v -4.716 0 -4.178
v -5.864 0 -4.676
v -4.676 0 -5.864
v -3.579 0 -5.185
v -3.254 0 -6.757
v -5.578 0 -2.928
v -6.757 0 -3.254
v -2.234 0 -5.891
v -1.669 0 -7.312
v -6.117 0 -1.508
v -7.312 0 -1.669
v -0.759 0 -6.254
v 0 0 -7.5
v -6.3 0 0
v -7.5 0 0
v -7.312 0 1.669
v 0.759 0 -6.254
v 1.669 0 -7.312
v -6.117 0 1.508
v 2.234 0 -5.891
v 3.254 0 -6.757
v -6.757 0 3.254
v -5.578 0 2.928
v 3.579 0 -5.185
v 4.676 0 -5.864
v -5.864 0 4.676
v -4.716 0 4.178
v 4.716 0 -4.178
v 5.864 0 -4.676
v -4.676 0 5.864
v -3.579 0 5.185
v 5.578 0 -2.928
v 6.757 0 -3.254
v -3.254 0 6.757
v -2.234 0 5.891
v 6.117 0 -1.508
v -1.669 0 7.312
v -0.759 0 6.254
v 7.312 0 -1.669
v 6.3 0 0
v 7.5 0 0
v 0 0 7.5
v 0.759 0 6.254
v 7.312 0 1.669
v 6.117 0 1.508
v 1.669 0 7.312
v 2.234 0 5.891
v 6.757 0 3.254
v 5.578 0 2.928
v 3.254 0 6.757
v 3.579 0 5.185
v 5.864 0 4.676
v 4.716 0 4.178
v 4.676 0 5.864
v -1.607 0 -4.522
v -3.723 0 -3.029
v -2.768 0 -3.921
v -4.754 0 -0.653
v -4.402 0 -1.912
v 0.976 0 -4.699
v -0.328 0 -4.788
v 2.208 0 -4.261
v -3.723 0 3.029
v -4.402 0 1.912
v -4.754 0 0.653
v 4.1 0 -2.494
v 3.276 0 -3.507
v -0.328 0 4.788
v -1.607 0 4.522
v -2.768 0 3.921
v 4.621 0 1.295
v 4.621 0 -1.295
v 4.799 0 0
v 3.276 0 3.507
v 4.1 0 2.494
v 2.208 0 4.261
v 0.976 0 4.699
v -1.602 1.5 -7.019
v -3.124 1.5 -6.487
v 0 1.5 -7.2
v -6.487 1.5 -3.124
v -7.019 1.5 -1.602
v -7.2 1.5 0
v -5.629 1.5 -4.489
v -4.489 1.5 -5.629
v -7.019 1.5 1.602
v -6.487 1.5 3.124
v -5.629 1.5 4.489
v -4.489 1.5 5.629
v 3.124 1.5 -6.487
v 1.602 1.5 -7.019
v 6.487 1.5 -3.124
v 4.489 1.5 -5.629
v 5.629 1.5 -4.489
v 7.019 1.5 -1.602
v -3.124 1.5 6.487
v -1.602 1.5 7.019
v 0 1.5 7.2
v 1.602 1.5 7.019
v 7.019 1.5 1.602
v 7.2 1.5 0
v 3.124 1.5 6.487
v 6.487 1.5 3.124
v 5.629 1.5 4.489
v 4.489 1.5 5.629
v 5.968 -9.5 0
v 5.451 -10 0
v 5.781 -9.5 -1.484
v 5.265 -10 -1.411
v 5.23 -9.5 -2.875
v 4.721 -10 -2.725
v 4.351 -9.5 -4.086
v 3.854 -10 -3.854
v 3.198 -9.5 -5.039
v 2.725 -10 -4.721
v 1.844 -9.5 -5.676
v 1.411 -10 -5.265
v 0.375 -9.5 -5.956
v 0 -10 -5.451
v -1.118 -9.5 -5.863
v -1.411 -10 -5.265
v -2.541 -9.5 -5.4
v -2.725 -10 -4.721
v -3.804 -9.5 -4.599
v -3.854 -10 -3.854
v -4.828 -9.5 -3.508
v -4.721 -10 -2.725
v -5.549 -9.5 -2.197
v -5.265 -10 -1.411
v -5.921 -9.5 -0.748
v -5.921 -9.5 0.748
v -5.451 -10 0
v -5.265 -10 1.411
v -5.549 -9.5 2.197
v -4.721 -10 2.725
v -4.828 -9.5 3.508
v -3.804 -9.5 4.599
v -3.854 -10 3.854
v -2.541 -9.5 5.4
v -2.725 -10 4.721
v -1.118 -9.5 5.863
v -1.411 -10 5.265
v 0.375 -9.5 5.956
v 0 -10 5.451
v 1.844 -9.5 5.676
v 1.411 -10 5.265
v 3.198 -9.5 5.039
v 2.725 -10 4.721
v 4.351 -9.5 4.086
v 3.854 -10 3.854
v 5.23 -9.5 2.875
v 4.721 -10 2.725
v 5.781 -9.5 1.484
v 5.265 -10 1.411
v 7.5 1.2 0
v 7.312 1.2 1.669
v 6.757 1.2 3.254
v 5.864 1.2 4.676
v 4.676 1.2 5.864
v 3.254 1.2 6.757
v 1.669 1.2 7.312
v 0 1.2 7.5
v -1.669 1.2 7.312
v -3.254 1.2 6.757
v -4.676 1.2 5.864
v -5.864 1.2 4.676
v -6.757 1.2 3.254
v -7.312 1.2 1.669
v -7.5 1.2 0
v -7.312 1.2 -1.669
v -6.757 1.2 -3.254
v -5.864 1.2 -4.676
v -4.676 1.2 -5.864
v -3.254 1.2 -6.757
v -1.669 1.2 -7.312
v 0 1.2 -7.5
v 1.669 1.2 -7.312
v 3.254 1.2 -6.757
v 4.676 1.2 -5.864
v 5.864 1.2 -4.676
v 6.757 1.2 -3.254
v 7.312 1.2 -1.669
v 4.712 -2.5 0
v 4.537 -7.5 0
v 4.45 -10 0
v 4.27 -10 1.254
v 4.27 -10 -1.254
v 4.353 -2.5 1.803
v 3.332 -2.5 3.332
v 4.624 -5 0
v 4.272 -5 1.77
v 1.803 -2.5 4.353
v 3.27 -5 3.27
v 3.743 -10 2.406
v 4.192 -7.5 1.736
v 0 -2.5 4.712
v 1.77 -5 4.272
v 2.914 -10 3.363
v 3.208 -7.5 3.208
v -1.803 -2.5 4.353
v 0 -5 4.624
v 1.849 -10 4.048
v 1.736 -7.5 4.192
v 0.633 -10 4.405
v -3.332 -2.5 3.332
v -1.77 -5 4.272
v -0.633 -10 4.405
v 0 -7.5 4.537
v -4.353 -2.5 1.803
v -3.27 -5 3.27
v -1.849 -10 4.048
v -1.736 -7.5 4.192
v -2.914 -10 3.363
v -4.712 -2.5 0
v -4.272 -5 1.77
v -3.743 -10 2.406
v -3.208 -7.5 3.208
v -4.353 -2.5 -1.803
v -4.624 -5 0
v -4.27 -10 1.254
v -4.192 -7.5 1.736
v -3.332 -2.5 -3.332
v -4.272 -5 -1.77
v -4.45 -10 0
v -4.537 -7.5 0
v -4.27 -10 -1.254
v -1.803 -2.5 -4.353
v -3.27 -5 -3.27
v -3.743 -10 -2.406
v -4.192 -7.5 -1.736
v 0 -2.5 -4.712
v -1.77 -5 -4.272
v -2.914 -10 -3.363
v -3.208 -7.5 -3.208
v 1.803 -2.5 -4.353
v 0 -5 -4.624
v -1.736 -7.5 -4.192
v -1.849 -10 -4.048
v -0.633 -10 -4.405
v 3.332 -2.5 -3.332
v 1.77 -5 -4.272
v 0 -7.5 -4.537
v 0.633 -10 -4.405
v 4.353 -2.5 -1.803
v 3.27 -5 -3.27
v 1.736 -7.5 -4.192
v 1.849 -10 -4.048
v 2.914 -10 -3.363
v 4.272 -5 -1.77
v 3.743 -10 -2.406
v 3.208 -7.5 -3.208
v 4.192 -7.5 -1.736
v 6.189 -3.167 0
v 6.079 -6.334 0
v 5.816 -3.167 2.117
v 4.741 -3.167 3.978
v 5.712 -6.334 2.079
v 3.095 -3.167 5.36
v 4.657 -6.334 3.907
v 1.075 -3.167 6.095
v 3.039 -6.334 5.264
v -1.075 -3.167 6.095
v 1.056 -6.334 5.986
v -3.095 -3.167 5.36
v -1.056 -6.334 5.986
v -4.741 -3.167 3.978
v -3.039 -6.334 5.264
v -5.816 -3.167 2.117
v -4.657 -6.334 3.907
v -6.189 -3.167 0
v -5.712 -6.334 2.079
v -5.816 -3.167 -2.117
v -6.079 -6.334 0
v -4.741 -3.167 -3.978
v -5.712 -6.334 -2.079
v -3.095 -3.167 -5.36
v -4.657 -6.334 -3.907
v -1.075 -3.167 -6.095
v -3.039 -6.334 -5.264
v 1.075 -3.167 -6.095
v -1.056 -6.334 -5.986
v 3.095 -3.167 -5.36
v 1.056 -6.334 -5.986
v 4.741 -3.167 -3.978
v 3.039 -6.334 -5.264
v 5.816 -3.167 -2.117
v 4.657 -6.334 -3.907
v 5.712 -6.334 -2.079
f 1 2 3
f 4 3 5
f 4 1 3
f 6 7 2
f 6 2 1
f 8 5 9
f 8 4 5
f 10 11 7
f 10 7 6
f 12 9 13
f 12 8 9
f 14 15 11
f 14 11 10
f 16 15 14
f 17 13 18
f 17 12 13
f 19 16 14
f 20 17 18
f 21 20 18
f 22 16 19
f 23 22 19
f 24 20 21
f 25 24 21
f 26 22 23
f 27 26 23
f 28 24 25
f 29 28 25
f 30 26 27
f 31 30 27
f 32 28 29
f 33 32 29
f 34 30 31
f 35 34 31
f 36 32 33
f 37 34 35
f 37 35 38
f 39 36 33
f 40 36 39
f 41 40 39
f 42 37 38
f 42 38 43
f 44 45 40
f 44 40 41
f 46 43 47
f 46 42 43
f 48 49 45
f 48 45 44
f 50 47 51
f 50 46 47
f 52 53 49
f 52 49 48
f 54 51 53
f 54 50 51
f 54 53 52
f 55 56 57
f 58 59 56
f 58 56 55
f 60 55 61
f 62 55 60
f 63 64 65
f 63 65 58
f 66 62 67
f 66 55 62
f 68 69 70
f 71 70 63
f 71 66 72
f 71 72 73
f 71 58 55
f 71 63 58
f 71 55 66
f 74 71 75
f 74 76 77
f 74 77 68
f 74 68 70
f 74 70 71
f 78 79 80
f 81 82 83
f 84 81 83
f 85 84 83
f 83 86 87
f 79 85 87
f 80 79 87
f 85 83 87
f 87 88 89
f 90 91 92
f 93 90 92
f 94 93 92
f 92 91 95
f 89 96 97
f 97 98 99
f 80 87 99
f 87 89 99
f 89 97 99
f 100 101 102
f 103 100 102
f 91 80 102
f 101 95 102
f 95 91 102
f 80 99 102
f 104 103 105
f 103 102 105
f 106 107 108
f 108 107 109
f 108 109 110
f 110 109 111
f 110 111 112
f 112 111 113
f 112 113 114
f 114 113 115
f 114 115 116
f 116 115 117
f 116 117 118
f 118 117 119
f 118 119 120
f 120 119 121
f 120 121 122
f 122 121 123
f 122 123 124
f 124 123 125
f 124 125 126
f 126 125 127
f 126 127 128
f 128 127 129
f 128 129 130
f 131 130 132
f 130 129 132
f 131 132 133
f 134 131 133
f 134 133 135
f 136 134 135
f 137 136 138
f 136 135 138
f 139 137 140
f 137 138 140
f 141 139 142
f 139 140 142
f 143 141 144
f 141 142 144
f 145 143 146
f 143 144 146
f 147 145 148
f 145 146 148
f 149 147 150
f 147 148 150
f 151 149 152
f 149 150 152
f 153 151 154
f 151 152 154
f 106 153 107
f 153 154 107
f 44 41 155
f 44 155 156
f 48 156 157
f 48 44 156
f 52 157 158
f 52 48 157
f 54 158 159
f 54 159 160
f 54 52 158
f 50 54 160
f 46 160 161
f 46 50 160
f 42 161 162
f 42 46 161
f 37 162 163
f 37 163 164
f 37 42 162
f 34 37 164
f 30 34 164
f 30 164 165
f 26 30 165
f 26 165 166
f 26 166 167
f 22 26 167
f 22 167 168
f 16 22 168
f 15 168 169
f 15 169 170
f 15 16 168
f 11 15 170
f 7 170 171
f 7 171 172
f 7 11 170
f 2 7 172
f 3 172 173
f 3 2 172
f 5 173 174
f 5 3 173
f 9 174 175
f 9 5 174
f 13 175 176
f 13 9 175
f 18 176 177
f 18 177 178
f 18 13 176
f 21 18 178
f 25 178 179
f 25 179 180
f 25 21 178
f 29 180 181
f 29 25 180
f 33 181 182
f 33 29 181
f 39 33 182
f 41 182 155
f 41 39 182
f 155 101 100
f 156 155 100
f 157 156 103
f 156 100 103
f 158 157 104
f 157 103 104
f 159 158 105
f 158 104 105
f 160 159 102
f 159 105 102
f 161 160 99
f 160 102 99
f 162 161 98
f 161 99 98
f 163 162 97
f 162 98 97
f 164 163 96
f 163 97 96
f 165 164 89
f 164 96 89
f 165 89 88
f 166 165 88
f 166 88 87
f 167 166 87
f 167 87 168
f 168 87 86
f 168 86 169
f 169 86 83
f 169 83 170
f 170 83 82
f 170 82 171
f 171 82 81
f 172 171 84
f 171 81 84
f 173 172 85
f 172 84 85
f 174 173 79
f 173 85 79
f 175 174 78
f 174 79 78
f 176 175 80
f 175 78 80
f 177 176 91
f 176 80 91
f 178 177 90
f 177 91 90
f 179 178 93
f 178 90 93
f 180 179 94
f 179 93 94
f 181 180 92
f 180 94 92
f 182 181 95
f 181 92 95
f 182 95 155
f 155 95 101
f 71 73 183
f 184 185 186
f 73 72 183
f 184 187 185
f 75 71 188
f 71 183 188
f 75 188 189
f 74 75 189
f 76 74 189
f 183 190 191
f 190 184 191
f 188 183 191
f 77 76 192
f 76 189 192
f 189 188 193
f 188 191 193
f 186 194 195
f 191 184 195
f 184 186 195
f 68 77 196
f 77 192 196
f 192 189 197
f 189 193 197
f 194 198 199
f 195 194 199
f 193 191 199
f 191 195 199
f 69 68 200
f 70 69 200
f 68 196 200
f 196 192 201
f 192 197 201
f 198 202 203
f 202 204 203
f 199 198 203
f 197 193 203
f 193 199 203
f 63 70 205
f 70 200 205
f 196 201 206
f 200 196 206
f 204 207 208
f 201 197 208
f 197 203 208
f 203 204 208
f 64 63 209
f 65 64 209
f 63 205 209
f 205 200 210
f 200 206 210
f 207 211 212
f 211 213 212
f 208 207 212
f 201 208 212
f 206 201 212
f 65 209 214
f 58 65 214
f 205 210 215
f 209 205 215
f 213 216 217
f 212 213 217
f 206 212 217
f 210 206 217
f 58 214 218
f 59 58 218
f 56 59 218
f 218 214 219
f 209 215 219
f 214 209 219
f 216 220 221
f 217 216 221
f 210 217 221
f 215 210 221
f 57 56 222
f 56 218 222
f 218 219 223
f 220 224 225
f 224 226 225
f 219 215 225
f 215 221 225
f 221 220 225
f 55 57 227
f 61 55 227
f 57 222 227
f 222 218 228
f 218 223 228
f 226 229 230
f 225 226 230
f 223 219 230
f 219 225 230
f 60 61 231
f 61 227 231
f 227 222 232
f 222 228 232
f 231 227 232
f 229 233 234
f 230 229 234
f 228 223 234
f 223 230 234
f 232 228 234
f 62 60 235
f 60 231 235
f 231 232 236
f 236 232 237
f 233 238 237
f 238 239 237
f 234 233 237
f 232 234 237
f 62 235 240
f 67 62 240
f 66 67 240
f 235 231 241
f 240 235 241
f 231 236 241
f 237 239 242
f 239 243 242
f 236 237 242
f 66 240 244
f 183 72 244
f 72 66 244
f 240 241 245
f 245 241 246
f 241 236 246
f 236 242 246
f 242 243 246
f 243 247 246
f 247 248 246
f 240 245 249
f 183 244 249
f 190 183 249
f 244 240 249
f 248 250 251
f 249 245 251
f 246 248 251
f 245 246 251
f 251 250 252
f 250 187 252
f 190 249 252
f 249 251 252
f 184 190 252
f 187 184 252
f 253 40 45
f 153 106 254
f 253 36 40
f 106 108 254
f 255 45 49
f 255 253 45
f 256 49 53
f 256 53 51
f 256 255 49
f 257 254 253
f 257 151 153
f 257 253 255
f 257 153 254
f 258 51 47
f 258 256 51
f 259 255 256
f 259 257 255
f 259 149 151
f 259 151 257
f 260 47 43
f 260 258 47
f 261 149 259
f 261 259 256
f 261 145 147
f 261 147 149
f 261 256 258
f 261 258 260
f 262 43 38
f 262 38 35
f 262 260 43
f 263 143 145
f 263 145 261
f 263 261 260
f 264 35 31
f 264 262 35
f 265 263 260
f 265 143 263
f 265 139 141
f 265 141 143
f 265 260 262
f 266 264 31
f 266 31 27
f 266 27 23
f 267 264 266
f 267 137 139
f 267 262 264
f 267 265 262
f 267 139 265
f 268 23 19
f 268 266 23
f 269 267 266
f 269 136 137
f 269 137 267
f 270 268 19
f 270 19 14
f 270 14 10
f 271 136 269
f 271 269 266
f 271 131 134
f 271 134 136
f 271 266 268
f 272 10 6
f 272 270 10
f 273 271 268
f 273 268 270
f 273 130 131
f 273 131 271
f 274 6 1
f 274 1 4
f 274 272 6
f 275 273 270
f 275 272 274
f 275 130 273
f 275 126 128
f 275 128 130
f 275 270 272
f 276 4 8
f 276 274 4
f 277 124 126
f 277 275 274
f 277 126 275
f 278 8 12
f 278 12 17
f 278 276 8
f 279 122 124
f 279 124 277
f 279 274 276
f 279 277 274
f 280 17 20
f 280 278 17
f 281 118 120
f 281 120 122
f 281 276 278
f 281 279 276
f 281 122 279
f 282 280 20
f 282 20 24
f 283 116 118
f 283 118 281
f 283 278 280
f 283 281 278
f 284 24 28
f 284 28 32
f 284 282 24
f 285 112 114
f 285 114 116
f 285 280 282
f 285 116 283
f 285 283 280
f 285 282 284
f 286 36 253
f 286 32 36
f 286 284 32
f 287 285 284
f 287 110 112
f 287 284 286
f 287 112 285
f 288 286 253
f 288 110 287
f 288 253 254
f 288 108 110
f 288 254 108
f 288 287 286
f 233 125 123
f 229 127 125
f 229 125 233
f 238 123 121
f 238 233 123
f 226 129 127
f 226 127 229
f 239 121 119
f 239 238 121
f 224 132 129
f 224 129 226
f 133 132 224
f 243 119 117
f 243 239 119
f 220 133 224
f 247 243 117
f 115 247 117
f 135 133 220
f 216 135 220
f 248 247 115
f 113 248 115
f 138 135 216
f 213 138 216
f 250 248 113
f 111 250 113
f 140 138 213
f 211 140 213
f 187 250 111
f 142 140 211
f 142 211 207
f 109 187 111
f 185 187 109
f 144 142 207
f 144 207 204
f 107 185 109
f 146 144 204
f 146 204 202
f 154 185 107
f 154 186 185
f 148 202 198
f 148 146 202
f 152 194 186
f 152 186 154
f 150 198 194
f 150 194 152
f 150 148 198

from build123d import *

# Parameters (mm, degrees)
F0_R      = 6.3
F1_DEPTH  = 10
F1_TAPER  = 2
F0_R_2    = 7.5
F1_FACE_R = 6.3
F2_DEPTH  = 1.5
F3_SIZE   = 0.3
F4_T      = -1.5


# Not quite as in the source:
# - a fillet or chamfer that OpenCascade refuses, or shapes differently, is made with other operations: its cross-section is extruded or revolved along the edge and cut away or added


with BuildPart() as f1:
    # F0 (on Front) → F1 (new body)
    with BuildSketch(Plane.XZ):
        Circle(F0_R)
    extrude(amount=F1_DEPTH, taper=F1_TAPER)

    # F0 (on Front) + F1_face (on face) → F2 (join)
    with BuildSketch(Plane.XZ):
        Circle(F0_R_2)
        Circle(F0_R, mode=Mode.SUBTRACT)
    with BuildSketch(Plane(origin=(0, 0, 0), x_dir=(1, 0, 0), z_dir=(0, 1, 0))):
        Circle(F1_FACE_R)
    extrude(amount=-F2_DEPTH, dir=(0, -1, 0))

    # F3
    f3_edges = [f1.edges().sort_by_distance(p)[0] for p in [
        (-7.5, 1.5, 0),
    ]]
    chamfer(f3_edges, length=F3_SIZE)

    # F4
    f4_openings = [f1.faces().sort_by_distance(p)[0] for p in [
        (0, -10, 0),
    ]]
    offset(amount=F4_T, openings=f4_openings, kind=Kind.INTERSECTION)

    # F5: chamfer of 0.5 on 1 edges, made by hand

    # F5_s1 → F5_t2 (revolve, cut)
    with BuildSketch(Plane.XY):
        Polygon((5.9682420534, -9.5003045865), (5.4507923051, -10), (5.9507923051, -10), align=None)
    revolve(axis=Axis((0, -10, 0), (0, 1, 0)), mode=Mode.SUBTRACT)


solid = f1.part
